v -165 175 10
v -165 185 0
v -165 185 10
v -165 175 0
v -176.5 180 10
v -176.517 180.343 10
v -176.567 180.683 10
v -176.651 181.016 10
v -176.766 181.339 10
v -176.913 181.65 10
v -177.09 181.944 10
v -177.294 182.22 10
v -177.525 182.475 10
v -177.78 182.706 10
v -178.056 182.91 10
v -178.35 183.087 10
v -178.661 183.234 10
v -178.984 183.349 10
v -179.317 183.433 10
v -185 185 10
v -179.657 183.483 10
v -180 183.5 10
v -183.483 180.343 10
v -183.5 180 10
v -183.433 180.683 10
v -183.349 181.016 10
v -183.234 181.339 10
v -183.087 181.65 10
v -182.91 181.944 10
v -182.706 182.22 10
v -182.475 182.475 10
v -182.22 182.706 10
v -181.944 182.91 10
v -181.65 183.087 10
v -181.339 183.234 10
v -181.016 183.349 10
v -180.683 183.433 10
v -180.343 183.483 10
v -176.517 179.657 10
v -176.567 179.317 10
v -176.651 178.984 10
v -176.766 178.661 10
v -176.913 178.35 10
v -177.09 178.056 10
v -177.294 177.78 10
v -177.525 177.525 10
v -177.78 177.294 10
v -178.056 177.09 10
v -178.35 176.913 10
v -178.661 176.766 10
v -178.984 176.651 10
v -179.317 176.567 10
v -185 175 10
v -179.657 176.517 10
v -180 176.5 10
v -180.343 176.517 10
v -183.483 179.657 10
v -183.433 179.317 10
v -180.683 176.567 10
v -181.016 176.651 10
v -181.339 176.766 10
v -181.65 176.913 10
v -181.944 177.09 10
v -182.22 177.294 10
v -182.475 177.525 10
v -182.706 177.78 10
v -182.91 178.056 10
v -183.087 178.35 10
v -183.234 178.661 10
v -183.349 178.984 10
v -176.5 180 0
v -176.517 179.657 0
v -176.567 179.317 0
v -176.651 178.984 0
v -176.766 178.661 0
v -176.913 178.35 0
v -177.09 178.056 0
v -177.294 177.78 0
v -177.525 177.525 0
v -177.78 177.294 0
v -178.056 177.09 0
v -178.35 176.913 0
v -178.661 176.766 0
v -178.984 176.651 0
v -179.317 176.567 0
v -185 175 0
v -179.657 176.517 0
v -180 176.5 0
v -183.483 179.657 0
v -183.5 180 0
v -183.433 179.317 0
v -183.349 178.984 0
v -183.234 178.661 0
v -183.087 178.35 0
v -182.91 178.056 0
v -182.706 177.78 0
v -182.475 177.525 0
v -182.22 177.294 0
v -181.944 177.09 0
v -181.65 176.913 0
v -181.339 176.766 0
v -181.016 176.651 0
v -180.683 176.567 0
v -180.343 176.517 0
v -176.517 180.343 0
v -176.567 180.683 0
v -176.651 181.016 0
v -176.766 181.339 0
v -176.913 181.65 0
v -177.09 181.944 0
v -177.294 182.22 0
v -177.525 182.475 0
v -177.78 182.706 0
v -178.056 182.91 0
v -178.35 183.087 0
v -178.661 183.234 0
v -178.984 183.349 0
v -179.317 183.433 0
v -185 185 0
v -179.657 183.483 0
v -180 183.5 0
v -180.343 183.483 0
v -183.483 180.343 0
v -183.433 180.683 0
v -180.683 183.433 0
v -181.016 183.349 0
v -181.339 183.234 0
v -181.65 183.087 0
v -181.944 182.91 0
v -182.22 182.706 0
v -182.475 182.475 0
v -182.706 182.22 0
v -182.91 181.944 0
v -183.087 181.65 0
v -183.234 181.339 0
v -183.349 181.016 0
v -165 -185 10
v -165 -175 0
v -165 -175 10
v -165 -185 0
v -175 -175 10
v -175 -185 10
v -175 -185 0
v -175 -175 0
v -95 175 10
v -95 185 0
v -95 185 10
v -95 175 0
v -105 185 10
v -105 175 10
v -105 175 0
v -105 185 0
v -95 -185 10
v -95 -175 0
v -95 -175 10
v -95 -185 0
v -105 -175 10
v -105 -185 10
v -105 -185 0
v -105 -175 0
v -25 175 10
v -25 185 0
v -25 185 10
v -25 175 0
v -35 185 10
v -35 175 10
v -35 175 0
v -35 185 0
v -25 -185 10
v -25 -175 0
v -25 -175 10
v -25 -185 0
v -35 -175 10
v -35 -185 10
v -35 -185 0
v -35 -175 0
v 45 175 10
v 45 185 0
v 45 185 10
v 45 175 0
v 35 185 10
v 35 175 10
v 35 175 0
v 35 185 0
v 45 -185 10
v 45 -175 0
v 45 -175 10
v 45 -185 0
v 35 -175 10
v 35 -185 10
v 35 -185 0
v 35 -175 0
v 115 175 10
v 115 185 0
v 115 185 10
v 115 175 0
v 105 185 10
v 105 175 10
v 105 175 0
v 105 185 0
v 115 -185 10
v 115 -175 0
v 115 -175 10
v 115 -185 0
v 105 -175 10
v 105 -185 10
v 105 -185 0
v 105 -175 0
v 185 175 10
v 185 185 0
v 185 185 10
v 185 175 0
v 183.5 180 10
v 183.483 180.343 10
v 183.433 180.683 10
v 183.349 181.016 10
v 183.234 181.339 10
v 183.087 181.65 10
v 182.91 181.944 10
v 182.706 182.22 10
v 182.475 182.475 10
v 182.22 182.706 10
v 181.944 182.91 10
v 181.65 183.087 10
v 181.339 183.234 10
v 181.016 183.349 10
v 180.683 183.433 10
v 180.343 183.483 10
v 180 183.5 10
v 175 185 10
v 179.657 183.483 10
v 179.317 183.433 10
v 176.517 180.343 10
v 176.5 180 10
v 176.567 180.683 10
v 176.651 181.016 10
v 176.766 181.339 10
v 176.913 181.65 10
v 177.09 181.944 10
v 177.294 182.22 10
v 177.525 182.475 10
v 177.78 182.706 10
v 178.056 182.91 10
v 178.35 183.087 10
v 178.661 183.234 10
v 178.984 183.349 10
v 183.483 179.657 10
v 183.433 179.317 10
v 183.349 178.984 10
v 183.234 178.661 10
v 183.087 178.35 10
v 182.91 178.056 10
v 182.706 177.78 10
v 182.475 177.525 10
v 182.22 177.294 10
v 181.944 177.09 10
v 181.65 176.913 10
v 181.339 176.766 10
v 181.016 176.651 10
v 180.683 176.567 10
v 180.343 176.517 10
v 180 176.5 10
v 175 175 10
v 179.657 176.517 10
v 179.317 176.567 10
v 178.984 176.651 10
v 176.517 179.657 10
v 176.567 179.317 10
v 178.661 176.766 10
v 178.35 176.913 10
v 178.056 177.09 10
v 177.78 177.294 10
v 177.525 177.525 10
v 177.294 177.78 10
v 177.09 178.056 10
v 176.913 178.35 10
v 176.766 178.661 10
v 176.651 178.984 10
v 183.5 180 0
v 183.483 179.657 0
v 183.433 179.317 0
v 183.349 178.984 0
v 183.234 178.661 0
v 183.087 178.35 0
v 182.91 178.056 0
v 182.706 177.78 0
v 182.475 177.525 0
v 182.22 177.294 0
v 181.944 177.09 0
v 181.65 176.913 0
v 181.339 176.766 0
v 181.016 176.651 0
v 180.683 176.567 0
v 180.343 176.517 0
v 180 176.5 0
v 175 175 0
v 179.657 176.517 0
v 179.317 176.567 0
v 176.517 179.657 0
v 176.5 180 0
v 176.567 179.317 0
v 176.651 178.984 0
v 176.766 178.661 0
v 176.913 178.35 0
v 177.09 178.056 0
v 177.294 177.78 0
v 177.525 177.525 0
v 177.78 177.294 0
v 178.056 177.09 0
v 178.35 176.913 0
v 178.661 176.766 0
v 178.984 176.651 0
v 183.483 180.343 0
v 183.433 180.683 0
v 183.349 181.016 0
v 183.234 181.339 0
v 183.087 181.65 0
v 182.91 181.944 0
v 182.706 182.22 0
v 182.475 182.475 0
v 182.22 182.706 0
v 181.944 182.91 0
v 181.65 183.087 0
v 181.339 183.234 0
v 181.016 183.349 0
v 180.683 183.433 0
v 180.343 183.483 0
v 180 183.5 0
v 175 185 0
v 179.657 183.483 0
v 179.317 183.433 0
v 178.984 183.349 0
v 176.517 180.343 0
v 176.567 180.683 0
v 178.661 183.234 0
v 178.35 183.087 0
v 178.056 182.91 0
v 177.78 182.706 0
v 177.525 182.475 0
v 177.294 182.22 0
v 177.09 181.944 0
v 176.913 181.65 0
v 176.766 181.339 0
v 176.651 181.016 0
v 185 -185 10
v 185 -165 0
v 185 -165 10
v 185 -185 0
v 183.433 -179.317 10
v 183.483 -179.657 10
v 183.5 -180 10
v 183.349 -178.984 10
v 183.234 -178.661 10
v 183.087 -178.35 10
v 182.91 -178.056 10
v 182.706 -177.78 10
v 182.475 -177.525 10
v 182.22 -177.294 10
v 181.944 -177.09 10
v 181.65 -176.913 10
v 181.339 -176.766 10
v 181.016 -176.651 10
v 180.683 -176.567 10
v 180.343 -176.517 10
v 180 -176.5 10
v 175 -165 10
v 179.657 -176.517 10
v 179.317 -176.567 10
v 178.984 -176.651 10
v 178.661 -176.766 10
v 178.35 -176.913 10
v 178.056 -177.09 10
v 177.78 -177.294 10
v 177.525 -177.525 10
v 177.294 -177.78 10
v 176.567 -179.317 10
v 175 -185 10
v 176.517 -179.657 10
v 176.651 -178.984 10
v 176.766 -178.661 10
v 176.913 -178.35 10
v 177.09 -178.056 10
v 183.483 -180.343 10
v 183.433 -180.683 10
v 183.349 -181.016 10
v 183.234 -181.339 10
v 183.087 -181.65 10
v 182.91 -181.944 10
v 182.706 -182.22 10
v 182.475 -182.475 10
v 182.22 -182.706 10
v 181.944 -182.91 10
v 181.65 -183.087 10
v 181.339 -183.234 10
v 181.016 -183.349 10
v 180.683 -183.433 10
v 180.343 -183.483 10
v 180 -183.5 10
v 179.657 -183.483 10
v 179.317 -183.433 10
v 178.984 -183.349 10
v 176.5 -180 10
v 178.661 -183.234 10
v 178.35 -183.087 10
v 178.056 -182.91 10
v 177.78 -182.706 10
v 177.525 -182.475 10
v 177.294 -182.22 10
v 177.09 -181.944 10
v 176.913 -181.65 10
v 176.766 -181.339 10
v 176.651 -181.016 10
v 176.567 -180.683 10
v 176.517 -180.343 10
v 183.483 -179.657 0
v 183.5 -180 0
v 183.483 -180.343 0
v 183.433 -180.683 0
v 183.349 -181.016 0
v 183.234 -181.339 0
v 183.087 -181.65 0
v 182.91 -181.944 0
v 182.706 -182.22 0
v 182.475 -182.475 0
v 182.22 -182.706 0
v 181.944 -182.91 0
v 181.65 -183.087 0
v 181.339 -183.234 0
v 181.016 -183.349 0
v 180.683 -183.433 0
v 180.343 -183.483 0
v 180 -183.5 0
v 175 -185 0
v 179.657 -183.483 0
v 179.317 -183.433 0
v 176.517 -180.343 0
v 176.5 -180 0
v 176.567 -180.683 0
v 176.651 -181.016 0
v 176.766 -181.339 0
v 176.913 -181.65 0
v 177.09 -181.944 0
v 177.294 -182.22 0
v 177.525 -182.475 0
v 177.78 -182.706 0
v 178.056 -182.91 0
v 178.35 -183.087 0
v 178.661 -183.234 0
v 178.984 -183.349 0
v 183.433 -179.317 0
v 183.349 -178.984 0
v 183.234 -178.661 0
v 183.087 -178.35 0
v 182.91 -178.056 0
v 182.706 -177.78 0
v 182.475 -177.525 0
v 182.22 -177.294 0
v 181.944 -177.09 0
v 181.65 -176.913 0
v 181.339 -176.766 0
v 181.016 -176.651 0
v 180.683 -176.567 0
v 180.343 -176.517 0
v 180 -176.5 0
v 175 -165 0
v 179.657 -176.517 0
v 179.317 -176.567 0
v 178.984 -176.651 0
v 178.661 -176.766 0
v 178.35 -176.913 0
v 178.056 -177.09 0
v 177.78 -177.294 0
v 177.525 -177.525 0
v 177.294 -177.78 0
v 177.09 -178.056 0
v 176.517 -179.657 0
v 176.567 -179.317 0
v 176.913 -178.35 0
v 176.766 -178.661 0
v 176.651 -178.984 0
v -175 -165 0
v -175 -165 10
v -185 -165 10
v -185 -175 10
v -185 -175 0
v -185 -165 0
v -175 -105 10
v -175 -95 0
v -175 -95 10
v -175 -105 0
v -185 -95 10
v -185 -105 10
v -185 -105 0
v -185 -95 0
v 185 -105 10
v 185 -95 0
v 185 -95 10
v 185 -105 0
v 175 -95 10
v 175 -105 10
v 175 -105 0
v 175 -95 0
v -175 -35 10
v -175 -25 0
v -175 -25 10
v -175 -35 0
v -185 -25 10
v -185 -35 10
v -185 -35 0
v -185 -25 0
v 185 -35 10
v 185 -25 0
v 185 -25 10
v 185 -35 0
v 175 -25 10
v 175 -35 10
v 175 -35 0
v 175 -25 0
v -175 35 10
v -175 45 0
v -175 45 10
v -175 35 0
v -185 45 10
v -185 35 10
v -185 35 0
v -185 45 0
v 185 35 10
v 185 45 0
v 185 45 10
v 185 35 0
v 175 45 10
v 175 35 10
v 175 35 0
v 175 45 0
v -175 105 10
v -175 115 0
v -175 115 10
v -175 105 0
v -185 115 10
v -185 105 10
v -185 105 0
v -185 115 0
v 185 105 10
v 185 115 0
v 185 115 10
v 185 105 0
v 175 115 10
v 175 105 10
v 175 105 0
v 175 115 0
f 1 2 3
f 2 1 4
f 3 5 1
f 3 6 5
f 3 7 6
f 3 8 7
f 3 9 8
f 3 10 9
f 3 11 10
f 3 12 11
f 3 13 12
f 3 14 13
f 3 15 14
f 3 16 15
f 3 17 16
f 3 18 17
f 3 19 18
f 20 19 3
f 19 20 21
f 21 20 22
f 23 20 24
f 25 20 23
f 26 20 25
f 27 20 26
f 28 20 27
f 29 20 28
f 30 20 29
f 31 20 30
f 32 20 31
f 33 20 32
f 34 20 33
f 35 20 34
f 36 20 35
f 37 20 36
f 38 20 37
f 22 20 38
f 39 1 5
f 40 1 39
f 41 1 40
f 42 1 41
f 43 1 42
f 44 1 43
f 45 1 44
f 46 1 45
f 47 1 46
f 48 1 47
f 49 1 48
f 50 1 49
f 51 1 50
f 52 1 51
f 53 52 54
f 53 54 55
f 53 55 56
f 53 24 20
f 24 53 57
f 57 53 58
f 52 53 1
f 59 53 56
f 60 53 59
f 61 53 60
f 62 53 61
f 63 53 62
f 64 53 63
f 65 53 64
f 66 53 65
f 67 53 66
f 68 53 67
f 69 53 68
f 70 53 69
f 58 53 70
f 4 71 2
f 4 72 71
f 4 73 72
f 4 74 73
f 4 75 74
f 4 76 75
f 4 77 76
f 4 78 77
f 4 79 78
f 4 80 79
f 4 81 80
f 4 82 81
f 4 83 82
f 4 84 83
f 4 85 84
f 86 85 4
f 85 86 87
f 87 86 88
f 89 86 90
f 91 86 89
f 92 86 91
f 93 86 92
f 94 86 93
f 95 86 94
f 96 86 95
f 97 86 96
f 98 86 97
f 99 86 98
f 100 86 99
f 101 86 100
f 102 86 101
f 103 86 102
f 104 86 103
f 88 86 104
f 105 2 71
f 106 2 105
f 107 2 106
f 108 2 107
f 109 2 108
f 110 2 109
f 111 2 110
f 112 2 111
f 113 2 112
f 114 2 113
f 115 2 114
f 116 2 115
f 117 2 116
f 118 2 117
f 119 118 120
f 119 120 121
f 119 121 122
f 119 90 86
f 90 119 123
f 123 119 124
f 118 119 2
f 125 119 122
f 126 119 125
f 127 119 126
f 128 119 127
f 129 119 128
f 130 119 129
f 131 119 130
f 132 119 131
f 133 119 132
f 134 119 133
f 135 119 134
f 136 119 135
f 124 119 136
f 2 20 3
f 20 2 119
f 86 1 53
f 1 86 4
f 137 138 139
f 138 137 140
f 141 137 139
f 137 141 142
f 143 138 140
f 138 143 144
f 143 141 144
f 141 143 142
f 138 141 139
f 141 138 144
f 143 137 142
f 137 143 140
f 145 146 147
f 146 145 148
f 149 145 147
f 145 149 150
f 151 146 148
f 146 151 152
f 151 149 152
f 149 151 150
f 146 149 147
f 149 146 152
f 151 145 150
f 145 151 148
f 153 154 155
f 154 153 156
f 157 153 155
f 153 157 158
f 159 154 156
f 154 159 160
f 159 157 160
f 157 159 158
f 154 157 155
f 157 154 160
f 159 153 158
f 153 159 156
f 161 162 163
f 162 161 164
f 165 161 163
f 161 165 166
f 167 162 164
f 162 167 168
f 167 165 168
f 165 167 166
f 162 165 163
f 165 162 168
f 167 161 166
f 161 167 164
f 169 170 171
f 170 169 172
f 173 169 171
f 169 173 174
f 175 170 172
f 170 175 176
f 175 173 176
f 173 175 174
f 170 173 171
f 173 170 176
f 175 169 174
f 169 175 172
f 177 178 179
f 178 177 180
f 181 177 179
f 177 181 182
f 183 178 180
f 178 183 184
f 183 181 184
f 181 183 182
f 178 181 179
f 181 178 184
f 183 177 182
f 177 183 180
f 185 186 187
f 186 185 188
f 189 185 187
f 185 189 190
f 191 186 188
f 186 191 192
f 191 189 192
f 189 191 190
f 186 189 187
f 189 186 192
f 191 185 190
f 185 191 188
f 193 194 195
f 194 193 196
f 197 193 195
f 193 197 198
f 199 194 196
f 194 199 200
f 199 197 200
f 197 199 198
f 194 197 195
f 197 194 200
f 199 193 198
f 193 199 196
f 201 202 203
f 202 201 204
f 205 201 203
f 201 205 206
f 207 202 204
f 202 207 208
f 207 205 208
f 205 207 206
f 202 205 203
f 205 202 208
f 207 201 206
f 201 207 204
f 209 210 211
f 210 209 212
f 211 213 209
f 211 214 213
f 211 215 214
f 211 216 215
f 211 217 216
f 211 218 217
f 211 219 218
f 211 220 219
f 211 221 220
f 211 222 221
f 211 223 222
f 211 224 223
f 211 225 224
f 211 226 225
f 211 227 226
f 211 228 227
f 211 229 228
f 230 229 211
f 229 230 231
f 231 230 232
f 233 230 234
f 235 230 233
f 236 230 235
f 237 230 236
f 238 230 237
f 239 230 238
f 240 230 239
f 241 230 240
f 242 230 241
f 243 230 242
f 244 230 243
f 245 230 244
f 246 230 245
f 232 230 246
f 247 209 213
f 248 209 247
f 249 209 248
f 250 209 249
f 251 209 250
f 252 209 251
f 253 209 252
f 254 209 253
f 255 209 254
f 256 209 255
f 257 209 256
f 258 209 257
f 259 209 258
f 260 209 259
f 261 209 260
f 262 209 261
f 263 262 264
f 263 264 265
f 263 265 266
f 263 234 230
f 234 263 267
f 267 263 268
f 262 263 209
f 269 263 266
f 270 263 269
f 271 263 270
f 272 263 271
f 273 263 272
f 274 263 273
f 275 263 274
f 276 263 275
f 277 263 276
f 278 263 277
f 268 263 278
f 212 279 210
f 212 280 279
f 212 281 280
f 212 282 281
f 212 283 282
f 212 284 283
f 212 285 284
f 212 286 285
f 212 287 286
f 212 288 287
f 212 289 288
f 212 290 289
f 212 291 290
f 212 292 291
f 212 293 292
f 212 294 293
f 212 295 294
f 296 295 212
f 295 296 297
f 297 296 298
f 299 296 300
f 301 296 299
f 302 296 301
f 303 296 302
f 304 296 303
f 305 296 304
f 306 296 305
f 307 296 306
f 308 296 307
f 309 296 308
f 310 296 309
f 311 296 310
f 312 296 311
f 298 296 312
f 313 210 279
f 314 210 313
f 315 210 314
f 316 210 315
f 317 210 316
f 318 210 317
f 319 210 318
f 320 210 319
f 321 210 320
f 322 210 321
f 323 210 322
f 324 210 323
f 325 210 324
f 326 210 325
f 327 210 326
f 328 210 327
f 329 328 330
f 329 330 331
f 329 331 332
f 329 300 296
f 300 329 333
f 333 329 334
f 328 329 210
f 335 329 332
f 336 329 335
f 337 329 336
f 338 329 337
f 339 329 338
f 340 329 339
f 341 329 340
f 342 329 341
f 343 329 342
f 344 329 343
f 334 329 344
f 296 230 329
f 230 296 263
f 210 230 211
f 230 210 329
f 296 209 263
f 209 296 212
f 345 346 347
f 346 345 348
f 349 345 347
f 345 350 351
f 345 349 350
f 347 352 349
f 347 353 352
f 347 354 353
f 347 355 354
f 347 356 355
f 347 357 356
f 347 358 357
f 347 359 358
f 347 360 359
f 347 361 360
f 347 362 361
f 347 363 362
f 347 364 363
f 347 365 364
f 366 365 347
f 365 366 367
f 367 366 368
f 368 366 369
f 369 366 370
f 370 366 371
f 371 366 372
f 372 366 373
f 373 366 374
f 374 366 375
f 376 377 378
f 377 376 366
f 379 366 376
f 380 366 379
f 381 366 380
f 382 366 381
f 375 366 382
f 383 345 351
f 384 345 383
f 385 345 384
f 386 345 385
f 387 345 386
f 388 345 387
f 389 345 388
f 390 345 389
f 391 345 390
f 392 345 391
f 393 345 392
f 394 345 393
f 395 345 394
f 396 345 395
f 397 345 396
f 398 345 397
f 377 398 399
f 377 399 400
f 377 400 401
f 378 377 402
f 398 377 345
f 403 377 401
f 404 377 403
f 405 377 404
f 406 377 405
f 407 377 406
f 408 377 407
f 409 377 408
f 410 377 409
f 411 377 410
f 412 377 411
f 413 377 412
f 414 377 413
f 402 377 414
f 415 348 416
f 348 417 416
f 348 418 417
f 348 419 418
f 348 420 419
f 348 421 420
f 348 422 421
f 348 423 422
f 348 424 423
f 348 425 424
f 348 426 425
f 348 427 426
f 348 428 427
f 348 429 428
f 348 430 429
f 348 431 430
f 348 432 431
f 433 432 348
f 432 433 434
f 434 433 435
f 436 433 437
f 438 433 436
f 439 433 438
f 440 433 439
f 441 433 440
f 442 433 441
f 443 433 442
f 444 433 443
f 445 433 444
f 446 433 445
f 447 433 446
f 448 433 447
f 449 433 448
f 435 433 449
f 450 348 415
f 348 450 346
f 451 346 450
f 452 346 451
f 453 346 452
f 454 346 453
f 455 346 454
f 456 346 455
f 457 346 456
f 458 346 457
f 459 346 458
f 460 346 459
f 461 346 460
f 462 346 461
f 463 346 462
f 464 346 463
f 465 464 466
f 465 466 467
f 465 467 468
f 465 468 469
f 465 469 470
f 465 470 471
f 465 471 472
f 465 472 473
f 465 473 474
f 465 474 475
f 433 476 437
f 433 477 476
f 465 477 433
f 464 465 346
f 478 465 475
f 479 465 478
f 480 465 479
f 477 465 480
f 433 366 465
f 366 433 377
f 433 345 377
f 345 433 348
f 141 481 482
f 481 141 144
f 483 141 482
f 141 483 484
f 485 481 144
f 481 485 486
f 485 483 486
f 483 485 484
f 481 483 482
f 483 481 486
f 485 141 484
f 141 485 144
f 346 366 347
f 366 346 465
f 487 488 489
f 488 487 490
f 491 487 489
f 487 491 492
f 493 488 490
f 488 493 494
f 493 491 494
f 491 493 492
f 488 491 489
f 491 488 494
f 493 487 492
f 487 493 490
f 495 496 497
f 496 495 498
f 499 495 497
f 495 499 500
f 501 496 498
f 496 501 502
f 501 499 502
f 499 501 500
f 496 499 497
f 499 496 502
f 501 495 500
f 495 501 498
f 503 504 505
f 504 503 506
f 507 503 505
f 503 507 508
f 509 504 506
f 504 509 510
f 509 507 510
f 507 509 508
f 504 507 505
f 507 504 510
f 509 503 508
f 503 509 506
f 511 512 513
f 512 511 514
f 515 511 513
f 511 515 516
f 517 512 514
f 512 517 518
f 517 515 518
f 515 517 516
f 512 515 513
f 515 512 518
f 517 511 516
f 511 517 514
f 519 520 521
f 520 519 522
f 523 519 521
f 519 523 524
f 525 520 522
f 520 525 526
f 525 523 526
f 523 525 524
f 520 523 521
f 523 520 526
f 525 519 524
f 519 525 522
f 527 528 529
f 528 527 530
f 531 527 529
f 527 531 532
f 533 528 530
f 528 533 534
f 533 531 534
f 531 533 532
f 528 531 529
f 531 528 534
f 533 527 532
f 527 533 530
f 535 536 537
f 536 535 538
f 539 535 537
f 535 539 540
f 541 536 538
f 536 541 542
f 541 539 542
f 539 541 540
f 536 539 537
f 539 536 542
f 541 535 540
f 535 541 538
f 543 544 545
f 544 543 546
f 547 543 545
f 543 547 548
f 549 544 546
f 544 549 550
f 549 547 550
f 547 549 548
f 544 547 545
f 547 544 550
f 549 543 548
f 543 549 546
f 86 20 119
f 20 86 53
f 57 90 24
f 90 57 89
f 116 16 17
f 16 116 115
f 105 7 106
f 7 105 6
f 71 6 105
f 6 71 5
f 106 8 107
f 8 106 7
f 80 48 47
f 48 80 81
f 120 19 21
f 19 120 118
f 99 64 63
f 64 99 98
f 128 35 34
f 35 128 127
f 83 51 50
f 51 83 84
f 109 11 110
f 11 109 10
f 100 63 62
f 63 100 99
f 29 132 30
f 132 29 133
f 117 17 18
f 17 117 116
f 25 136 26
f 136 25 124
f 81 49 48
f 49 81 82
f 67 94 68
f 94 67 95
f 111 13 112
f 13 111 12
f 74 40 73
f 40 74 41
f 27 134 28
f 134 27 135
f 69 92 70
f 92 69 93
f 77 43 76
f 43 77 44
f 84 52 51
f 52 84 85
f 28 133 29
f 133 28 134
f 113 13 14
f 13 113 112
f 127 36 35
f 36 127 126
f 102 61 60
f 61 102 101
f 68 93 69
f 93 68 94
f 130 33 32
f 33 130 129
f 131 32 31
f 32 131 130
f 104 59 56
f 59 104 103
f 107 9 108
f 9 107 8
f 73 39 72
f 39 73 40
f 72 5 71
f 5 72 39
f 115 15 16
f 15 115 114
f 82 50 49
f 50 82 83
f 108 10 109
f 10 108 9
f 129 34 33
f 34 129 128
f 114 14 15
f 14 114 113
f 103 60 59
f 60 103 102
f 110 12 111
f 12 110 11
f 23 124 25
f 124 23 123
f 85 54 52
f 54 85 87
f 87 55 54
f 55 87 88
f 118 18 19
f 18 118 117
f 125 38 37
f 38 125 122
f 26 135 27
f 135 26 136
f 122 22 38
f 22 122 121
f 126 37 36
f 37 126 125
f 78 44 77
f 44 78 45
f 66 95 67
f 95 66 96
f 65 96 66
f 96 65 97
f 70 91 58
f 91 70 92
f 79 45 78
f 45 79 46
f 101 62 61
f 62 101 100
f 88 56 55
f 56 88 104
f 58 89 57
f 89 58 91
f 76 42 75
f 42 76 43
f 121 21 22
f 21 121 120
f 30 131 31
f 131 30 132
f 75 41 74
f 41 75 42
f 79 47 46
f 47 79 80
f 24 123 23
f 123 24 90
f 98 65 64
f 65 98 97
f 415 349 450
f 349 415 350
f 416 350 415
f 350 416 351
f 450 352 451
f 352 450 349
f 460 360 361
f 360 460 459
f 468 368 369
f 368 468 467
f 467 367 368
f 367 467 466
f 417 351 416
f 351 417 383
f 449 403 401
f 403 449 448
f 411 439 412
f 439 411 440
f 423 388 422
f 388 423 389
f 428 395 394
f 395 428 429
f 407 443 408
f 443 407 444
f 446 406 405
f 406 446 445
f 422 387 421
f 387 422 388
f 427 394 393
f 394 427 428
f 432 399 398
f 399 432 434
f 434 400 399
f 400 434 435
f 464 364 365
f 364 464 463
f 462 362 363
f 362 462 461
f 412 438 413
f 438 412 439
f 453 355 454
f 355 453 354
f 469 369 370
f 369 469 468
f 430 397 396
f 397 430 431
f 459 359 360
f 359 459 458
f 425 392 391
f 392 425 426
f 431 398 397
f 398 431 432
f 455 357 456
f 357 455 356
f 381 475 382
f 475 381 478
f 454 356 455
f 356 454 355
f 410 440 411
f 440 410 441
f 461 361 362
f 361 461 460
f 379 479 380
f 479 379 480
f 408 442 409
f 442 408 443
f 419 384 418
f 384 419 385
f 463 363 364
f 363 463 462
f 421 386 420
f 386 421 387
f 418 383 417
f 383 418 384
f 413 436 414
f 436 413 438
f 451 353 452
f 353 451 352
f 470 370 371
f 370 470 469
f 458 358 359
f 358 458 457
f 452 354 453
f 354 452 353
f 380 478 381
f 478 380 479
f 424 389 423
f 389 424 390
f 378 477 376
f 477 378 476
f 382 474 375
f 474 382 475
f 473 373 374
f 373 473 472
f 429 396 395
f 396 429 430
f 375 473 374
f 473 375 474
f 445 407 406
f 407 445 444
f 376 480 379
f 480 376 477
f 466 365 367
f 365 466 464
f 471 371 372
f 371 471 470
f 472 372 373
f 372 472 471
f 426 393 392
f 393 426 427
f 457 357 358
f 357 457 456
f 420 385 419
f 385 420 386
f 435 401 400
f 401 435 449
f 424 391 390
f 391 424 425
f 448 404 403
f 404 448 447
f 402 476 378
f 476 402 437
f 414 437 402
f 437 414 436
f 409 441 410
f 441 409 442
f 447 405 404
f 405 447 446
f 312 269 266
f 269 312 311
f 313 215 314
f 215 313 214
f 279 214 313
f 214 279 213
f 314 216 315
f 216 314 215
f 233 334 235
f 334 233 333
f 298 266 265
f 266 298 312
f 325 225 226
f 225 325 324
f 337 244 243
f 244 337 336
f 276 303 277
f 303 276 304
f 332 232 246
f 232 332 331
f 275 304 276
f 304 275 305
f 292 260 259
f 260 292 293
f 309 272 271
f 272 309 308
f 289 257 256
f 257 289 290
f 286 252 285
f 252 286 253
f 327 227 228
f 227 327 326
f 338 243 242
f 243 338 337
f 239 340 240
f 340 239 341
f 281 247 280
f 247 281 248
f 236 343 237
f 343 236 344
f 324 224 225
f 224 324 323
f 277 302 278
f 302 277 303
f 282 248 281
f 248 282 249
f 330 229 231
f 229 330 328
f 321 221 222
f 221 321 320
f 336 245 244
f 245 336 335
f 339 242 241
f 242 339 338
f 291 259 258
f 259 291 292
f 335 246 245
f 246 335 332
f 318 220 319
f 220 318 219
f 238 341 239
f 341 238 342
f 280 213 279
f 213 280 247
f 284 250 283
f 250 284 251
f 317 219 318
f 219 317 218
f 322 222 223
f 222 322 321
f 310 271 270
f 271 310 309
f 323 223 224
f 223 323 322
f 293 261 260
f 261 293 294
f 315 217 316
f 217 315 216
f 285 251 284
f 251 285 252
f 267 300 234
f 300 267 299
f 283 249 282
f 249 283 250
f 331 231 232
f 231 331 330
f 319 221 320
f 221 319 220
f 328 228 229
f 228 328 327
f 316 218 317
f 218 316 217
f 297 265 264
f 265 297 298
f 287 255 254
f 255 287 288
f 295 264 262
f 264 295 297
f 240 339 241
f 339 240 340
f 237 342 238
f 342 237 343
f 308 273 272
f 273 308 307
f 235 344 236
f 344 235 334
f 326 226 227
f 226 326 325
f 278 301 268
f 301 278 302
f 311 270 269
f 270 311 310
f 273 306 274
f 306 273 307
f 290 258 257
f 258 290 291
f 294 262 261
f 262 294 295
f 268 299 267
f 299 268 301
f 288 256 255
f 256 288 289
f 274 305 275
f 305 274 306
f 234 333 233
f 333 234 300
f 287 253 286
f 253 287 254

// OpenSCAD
// ring_49.scad - ring index 49 (z bottom = 490 mm)
$fn = 64; bar = 10; half_b = bar/2; outer = 370; half_outer = outer/2;
front_y = 180; back_y = -180; left_x = -180; right_x = 180;
x_centers = [-170, -100, -30, 40, 110, 180];
z_centers = [5, 85, 155, 225, 295, 365, 435, 505, 575, 645, 715]; ring_z = 490;
module place_box(cx, cy, sx, sy) { translate([cx - sx/2, cy - sy/2, 0]) cube([sx, sy, bar]); }

difference() { union() {
    for (x = x_centers) { place_box(x, front_y, bar, bar); place_box(x, back_y, bar, bar); }
    for (y = x_centers) { place_box(left_x, y, bar, bar); place_box(right_x, y, bar, bar); }
    for (zc = z_centers) if ((zc - half_b < ring_z + bar) && (zc + half_b > ring_z)) {
        translate([-half_outer, front_y - half_b, 0]) cube([outer, bar, bar]);
        translate([-half_outer, back_y - half_b, 0])  cube([outer, bar, bar]);
        translate([left_x - half_b, -half_outer, 0])  cube([bar, outer, bar]);
        translate([right_x - half_b, -half_outer, 0]) cube([bar, outer, bar]);
    }
  }
  for (cx = [-180, 180]) for (cy = [-180, 180]) translate([cx, cy, 0]) cylinder(h = bar, r = 3.5, $fn = 64);
}
